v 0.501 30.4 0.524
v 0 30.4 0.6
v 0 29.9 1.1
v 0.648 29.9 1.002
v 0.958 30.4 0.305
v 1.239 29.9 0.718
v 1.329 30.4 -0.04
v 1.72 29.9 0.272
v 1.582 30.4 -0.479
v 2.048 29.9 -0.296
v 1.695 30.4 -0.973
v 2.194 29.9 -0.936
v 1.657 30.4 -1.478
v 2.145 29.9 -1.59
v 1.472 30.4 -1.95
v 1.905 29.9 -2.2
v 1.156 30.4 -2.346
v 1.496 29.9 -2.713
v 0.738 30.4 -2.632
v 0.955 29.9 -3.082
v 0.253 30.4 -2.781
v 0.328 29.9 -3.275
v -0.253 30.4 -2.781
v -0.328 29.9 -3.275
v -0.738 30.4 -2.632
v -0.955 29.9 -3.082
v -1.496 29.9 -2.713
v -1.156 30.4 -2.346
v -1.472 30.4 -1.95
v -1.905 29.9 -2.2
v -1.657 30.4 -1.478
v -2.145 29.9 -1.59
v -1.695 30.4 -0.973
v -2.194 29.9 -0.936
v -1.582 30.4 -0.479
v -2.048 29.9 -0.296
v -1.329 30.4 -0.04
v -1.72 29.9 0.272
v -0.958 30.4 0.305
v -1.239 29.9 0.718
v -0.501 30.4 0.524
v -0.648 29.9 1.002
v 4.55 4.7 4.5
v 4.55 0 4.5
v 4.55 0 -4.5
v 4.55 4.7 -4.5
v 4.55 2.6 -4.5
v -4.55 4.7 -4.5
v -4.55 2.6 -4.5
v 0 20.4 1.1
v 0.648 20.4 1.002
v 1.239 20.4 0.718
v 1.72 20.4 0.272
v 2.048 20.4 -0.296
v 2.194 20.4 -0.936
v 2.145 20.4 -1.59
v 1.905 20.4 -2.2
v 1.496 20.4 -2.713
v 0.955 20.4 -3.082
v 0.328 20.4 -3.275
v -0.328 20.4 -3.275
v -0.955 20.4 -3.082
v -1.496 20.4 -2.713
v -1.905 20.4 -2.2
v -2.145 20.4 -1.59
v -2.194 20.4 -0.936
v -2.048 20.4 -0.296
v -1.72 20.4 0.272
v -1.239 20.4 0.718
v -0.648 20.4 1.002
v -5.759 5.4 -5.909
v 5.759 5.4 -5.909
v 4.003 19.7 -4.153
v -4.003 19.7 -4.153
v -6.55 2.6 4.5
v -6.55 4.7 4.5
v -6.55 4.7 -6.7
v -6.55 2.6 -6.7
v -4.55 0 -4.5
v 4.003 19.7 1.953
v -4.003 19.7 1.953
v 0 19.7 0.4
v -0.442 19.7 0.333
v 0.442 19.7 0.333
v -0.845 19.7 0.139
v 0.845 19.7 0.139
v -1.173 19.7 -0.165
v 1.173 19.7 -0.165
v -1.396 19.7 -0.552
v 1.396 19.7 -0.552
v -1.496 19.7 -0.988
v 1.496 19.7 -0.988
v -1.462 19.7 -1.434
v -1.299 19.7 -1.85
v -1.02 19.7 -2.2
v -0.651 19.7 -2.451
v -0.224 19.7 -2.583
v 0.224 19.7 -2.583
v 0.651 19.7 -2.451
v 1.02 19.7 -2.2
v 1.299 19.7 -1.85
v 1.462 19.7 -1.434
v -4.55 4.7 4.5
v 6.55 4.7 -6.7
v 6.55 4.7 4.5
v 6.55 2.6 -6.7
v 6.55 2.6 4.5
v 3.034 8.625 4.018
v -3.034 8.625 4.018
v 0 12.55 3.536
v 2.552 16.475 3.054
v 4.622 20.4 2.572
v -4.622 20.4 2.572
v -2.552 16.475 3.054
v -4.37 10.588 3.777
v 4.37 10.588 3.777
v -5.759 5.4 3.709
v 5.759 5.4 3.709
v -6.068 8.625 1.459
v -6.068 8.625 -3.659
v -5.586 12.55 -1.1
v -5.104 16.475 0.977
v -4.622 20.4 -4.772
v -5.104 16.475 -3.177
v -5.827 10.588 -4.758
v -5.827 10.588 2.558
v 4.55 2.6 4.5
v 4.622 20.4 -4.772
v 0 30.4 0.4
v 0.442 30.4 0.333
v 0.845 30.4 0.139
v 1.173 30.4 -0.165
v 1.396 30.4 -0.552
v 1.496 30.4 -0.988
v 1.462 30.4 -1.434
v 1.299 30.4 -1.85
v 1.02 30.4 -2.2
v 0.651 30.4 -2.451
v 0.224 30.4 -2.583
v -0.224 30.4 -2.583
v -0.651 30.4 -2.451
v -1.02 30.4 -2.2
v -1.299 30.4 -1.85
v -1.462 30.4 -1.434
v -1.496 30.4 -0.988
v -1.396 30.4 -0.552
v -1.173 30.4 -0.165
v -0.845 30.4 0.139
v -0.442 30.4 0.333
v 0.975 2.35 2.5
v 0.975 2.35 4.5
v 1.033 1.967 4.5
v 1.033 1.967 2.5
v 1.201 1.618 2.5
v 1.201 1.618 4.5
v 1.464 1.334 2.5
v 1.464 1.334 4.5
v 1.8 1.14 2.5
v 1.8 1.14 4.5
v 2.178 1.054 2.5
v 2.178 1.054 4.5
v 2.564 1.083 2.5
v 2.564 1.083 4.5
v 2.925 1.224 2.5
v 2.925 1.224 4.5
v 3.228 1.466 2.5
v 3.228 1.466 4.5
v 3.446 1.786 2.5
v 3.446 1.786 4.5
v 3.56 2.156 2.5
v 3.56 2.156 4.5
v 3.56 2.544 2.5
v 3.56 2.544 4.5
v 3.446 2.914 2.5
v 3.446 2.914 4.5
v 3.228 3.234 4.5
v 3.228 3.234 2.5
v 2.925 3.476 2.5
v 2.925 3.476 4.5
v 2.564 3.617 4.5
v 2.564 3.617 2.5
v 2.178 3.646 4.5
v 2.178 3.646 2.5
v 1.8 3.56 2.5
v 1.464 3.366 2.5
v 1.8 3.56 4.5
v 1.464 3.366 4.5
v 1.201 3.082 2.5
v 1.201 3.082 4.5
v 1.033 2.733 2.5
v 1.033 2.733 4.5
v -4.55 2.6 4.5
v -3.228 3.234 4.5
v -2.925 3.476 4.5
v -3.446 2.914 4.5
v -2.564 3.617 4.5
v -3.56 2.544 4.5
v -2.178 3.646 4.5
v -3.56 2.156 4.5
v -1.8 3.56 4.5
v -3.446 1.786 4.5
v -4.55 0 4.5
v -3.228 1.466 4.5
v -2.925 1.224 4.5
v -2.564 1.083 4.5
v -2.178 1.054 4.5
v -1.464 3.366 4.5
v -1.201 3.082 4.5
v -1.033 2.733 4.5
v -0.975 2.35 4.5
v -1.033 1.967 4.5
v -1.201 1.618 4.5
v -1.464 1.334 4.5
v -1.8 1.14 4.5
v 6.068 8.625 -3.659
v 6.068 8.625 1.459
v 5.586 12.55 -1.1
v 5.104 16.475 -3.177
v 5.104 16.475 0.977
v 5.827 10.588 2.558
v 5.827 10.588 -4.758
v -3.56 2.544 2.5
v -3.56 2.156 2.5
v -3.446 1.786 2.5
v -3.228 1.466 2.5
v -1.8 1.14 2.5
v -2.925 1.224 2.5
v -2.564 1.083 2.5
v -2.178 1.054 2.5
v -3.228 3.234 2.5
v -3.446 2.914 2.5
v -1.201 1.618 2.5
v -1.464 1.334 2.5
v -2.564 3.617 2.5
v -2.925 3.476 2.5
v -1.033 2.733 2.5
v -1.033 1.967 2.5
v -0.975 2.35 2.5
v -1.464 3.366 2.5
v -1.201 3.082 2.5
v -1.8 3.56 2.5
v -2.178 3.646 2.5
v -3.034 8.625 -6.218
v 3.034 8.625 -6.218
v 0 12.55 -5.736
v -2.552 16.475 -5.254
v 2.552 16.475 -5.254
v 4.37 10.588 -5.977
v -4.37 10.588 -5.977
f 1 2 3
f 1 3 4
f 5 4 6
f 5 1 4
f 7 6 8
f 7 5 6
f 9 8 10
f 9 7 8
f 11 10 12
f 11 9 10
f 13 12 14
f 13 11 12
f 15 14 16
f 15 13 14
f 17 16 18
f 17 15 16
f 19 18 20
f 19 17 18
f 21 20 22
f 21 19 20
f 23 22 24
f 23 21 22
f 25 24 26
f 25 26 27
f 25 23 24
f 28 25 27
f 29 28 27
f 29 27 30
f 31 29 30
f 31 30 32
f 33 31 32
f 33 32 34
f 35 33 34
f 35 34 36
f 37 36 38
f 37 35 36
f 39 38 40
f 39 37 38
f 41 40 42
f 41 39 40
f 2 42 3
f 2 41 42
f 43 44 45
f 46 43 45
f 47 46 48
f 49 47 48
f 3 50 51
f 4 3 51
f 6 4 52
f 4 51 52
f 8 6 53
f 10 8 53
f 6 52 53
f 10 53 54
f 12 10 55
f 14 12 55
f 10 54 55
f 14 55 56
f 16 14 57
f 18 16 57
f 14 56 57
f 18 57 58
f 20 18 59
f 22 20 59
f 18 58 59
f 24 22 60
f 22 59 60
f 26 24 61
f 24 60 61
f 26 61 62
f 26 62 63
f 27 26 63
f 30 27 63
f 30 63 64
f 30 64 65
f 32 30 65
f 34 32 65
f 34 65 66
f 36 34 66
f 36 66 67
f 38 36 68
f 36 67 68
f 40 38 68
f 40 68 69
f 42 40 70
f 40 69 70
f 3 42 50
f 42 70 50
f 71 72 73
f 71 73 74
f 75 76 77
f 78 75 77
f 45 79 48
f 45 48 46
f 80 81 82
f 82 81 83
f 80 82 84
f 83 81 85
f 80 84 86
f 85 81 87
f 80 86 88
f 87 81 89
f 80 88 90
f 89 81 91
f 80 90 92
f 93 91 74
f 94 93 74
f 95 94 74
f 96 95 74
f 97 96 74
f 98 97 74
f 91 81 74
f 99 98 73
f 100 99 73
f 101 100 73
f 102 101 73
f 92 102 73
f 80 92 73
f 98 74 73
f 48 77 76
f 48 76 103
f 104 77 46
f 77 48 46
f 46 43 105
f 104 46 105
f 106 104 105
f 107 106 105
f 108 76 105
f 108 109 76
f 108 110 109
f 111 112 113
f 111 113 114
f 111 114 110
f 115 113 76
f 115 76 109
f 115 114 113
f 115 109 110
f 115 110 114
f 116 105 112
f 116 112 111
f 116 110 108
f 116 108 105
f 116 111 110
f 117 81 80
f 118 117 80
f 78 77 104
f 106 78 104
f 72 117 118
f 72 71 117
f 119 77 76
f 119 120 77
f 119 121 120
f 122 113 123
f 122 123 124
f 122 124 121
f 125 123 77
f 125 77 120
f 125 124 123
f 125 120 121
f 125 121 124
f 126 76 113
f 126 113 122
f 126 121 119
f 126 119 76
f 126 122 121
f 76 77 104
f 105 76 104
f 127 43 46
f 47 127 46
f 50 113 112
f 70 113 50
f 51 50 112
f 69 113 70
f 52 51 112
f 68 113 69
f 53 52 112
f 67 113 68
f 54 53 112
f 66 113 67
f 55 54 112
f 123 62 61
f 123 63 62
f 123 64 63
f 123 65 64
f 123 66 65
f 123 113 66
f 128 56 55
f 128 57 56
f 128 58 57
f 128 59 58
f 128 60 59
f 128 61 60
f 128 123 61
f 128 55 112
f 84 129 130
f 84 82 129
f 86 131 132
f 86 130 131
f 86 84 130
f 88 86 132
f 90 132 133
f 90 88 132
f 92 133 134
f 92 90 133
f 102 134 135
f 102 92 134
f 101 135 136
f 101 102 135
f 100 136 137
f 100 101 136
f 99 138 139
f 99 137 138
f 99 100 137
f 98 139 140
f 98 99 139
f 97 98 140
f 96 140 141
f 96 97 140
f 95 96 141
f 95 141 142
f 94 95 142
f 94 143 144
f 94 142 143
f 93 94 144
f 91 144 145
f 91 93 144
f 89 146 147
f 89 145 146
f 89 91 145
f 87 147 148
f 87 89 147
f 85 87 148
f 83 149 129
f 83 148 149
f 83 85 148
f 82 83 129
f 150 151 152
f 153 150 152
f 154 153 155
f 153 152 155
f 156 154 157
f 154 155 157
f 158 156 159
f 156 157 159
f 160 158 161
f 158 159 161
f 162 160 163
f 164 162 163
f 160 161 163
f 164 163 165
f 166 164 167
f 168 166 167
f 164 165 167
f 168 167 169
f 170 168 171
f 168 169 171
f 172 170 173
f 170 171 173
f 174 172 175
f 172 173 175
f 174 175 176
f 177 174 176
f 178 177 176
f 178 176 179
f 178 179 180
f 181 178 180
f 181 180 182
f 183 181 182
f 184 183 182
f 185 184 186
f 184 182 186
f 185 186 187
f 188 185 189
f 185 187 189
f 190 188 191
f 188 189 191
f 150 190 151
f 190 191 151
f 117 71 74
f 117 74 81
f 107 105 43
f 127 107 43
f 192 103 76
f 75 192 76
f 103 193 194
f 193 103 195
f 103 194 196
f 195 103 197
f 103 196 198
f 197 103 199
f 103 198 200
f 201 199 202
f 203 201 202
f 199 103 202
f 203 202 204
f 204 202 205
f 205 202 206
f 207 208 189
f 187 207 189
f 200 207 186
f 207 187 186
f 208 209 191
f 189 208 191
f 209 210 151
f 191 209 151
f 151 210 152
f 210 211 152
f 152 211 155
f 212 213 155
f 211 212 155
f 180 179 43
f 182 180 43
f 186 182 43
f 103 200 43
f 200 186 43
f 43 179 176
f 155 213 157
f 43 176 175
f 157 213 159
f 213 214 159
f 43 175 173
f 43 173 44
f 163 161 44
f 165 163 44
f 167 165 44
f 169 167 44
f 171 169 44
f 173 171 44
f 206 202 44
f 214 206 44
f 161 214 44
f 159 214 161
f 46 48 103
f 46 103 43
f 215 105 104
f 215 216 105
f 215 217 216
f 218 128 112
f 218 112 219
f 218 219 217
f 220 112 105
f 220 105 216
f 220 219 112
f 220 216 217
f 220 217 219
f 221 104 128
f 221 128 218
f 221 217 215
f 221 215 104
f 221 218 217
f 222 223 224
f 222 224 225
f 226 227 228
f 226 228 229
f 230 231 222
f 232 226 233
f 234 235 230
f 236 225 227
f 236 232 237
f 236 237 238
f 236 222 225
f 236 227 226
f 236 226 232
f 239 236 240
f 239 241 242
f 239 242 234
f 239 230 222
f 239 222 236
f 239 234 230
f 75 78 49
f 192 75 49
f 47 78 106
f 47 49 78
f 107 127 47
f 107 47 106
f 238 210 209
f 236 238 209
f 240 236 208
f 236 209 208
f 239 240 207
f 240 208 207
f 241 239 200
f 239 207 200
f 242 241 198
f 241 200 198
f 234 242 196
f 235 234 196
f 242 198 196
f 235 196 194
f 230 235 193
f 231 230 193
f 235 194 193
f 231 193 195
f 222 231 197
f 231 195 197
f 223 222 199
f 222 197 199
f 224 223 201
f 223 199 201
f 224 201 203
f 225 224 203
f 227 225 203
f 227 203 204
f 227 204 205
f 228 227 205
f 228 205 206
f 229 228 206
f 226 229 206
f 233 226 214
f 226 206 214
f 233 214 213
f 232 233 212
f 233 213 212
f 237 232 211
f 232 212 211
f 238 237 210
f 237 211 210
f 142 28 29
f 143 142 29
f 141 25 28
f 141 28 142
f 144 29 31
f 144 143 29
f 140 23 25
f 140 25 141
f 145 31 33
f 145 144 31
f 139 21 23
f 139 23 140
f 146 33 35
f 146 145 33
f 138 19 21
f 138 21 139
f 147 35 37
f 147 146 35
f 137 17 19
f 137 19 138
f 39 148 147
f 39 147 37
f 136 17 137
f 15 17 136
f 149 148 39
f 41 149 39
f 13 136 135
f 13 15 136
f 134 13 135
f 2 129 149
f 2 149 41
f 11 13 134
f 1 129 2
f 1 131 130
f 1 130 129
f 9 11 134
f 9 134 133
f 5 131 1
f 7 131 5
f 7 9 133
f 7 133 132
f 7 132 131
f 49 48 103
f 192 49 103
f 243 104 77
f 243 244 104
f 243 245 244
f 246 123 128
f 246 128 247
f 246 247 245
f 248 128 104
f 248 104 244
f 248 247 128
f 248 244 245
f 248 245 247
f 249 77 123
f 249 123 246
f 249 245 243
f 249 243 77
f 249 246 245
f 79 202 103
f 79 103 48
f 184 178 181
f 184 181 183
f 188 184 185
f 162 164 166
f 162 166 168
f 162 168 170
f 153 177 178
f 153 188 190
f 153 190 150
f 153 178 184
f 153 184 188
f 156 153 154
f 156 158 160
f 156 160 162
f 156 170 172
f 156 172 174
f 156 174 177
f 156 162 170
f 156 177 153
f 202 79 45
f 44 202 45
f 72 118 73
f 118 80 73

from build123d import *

# Parameters (mm, degrees)
ESBO_O1_W                = 9.1
ESBO_O1_H                = 9
RESSALTO_EXTRUS_O1_DEPTH = 4.7
ESBO_O2_W                = 13.1
ESBO_O2_H                = 11.2
RESSALTO_EXTRUS_O2_DEPTH = 15.7
RESSALTO_EXTRUS_O2_TAPER = 7
ESBO_O3_R                = 2.2
RESSALTO_EXTRUS_O3_DEPTH = 10
CASCA1_T                 = -0.7
CHANFRO1_SIZE            = 0.5
ESBO_O4_R                = 1.3
CORTE_EXTRUS_O1_DEPTH    = 2
RESSALTO_EXTRUS_O4_DEPTH = 2.1


with BuildPart() as part:
    # Esboço1 → Ressalto-extrusão1 (new body)
    with BuildSketch(Plane(origin=(0, 0, 0), x_dir=(1, 0, 0), z_dir=(0, 1, 0))):
        Rectangle(ESBO_O1_W, ESBO_O1_H)
    extrude(amount=RESSALTO_EXTRUS_O1_DEPTH)

    # Esboço4 → Corte-extrusão1 (cut)
    with BuildSketch(Plane.XY.offset(4.5)):
        with Locations((-2.275, 2.35)):
            Circle(ESBO_O4_R)
        with Locations(Location((2.275, 2.35, 0), (0, 0, 180))):
            Circle(ESBO_O4_R)
    extrude(amount=-CORTE_EXTRUS_O1_DEPTH, mode=Mode.SUBTRACT)


with BuildPart() as body_2:
    # Esboço2 → Ressalto-extrusão2 (new body)
    with BuildSketch(Plane(origin=(0, 4.7, 0), x_dir=(1, 0, 0), z_dir=(0, 1, 0))):
        with Locations((0, 1.1)):
            Rectangle(ESBO_O2_W, ESBO_O2_H)
    extrude(amount=RESSALTO_EXTRUS_O2_DEPTH, taper=RESSALTO_EXTRUS_O2_TAPER)

    # Esboço3 → Ressalto-extrusão3 (add)
    with BuildSketch(Plane(origin=(0, 20.4, 0), x_dir=(1, 0, 0), z_dir=(0, 1, 0))):
        with Locations(Location((0, 1.1, 0), (0, 0, 270))):
            Circle(ESBO_O3_R)
    extrude(amount=RESSALTO_EXTRUS_O3_DEPTH)

    # Casca1
    casca1_openings = [body_2.faces().sort_by_distance(p)[0] for p in [
        (0, 30.4, -1.1),
    ]]
    offset(amount=CASCA1_T, openings=casca1_openings, kind=Kind.INTERSECTION)

    # Chanfro1
    chanfro1_edges = [body_2.edges().sort_by_distance(p)[0] for p in [
        (0, 30.4, -3.3),
    ]]
    chamfer(chanfro1_edges, length=CHANFRO1_SIZE)


with BuildPart() as body_3:
    # Esboço5 → Ressalto-extrusão4 (new body)
    with BuildSketch(Plane.XZ.offset(-4.7)):
        Polygon((-4.55, 4.5), (-6.55, 4.5), (-6.55, -6.7), (6.55, -6.7), (6.55, 4.5), (4.55, 4.5), (4.55, -4.5), (-4.55, -4.5), align=None)
    extrude(amount=RESSALTO_EXTRUS_O4_DEPTH)


solid = Compound([part.part, body_2.part, body_3.part])
